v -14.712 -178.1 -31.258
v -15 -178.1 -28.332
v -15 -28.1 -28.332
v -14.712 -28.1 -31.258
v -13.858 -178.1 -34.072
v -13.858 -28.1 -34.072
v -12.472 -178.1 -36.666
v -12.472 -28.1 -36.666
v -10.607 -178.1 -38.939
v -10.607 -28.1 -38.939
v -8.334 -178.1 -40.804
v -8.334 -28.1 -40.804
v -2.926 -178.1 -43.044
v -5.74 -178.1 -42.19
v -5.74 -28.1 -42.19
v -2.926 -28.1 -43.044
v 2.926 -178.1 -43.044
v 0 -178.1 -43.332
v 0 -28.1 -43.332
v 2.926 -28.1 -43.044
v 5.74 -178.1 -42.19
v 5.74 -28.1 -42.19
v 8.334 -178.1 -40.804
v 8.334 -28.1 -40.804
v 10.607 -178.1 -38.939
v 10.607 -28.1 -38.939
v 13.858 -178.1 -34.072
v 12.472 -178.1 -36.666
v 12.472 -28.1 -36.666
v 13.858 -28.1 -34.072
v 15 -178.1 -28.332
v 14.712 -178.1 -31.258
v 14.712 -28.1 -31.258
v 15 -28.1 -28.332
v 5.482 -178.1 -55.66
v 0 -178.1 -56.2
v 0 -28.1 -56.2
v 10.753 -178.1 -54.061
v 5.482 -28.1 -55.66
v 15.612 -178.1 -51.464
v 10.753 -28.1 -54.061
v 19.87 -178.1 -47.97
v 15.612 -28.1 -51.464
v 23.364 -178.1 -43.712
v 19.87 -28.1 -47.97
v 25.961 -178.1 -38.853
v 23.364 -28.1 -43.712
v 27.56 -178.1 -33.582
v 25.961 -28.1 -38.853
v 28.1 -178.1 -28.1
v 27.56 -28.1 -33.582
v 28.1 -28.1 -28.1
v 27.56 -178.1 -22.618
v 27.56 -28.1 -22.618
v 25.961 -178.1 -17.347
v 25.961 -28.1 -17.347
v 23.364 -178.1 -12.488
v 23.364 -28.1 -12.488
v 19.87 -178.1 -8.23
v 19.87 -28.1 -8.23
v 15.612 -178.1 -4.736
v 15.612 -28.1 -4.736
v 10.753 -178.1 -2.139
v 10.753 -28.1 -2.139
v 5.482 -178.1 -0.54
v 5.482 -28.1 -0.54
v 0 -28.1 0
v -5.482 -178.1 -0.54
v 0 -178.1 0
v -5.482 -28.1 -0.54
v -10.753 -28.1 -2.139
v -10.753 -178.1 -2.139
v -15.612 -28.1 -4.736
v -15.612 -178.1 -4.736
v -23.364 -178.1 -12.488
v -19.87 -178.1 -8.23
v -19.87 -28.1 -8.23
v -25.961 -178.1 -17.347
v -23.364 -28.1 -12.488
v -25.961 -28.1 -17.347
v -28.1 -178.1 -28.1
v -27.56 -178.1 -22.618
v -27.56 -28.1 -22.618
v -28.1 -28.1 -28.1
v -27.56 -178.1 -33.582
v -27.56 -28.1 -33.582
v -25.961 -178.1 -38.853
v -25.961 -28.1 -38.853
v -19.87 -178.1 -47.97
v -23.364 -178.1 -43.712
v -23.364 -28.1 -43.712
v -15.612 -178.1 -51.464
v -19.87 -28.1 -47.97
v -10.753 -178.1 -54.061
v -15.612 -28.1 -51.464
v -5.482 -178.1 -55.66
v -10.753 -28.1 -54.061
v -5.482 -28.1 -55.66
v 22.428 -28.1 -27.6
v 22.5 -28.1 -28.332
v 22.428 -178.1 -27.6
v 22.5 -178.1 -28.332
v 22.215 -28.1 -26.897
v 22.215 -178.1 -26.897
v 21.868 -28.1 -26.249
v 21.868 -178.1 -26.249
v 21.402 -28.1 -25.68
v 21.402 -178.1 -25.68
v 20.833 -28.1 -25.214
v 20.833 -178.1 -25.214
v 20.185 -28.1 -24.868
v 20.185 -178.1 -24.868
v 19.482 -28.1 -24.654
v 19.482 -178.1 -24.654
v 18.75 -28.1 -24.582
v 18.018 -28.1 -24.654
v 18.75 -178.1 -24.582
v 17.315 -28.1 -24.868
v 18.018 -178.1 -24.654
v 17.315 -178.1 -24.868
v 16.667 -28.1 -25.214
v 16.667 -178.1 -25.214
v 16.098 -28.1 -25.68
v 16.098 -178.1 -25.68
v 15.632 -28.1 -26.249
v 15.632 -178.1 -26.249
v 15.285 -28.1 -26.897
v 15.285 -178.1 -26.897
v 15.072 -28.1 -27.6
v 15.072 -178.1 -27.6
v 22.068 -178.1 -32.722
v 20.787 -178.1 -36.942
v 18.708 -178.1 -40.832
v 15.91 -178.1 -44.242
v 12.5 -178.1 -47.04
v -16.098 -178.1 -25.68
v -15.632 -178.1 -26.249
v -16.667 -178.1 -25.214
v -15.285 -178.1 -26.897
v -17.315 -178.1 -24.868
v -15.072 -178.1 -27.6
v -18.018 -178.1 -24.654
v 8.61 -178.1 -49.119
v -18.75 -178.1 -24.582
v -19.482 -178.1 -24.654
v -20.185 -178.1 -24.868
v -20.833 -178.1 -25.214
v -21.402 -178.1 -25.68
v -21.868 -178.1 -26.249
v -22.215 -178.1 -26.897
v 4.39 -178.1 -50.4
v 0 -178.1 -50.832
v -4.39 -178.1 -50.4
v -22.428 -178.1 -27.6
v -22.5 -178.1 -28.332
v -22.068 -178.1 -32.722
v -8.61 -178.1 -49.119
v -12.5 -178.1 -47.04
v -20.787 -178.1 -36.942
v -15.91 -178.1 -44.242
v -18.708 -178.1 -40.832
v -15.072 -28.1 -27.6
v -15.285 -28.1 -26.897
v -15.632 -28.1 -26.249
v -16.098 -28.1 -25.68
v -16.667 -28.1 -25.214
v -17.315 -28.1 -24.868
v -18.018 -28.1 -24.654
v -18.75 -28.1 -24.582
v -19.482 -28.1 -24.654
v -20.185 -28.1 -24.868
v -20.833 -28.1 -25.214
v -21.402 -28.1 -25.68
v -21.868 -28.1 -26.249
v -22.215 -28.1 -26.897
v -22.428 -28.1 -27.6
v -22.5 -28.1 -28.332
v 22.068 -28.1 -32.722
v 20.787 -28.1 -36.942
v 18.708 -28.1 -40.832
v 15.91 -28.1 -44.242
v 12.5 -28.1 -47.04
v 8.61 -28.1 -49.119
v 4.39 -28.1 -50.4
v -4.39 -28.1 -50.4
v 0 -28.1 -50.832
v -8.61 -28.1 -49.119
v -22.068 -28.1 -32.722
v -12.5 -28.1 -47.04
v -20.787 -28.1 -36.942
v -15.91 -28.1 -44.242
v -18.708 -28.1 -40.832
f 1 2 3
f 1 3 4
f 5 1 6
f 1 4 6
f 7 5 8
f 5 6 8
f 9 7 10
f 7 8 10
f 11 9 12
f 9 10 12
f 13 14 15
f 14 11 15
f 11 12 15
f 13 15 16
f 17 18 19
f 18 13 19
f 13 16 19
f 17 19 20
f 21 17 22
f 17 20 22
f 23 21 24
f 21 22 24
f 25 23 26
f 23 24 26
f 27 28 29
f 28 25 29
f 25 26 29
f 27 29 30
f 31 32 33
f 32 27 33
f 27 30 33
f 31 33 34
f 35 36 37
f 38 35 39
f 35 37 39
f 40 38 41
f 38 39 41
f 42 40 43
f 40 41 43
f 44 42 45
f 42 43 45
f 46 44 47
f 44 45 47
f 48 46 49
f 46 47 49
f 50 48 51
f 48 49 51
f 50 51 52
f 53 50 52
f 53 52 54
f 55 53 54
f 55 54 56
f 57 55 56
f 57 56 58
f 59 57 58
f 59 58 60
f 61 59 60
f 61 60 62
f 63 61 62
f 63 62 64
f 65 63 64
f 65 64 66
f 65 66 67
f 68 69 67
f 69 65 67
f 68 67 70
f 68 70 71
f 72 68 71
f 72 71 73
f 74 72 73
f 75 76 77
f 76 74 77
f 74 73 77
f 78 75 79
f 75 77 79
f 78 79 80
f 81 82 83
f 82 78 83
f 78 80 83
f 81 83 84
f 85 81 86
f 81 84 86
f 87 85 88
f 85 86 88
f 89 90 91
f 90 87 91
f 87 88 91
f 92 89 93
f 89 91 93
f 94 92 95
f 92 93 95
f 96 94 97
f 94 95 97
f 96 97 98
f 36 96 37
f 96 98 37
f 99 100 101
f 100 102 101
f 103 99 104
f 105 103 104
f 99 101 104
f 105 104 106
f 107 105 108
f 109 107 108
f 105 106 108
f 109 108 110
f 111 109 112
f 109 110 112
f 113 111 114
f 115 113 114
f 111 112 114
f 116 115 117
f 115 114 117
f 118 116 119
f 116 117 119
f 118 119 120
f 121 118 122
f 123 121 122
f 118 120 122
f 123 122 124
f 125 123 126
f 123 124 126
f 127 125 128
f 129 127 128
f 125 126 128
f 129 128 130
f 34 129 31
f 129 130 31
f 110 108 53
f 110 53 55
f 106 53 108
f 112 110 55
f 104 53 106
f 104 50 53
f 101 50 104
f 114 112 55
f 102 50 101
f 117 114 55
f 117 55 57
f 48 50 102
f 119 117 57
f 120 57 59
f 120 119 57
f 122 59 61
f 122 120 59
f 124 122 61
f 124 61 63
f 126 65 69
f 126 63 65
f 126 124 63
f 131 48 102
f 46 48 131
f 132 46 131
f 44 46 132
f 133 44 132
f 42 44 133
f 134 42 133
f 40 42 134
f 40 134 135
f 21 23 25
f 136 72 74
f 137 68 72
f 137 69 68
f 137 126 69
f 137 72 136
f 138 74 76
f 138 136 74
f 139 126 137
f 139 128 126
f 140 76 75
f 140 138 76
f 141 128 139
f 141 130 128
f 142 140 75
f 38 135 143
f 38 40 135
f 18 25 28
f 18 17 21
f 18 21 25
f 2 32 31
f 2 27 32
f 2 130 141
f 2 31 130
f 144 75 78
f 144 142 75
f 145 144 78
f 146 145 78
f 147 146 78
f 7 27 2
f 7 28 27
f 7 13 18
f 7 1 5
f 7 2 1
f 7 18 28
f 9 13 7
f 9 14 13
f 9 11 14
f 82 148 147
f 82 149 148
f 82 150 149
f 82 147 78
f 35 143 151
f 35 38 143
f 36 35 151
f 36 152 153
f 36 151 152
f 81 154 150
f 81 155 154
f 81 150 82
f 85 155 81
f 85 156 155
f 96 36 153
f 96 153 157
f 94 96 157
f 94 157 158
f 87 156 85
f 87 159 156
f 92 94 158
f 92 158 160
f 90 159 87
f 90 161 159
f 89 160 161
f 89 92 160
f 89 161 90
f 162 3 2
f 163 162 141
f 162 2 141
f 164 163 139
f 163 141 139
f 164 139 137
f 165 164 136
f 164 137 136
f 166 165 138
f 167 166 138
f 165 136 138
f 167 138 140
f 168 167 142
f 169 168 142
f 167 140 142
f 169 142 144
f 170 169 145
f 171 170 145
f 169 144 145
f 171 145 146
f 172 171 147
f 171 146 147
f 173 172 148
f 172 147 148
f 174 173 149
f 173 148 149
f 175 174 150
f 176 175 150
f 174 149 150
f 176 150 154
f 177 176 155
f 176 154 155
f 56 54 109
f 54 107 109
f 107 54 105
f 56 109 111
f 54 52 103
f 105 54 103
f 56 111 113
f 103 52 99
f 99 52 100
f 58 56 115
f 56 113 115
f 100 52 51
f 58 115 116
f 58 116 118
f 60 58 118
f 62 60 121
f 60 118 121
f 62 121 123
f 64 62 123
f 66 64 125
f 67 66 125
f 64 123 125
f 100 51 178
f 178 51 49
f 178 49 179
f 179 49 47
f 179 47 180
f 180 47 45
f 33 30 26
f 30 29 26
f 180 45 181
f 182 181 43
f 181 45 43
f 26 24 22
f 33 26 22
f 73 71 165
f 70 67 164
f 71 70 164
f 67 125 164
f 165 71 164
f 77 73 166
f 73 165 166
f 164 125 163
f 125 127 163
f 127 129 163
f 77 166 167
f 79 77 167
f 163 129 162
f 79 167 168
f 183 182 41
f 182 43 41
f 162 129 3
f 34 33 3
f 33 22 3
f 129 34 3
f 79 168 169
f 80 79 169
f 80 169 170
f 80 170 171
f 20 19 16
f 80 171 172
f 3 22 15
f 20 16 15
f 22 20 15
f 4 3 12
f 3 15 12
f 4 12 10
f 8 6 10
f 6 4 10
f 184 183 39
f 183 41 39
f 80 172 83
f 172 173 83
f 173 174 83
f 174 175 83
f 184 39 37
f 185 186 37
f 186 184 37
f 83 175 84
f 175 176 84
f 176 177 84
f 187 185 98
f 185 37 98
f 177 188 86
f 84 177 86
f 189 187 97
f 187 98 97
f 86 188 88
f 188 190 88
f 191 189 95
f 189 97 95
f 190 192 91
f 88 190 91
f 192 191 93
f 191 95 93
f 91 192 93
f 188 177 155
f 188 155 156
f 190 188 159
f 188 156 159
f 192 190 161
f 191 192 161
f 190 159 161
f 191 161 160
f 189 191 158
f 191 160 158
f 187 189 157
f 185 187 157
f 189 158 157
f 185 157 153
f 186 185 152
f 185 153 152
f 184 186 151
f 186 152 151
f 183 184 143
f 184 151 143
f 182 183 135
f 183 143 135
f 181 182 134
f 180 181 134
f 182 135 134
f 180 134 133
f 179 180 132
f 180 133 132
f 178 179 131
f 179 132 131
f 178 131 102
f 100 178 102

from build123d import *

# Parameters (mm, degrees)
SKETCH1_R           = 28.1
BOSS_EXTRUDE2_DEPTH = 61.3
SKETCH3_R           = 18.6
CUT_EXTRUDE2_DEPTH  = 58.8
SKETCH4_W           = 56.2
SKETCH4_H           = 56.2
BOSS_EXTRUDE3_DEPTH = 56.2
SKETCH5_R           = 16.1
CUT_EXTRUDE4_DEPTH  = 5
SKETCH6_W           = 49.797391422
SKETCH6_H           = 49.779255452
CUT_EXTRUDE5_DEPTH  = 53.7
SKETCH7_R           = 28.1
BOSS_EXTRUDE4_DEPTH = 321.5
CUT_EXTRUDE6_DEPTH  = 10
SKETCH9_R           = 3
CUT_EXTRUDE7_DEPTH  = 1
SKETCH10_R          = 6.025
CUT_EXTRUDE8_DEPTH  = 0.1
SKETCH18_R          = 3.75
CUT_EXTRUDE9_DEPTH  = 100
SKETCH19_R          = 3.75
CUT_EXTRUDE11_DEPTH = 325
SKETCH20_W          = 56.2
SKETCH20_H          = 56.2
CUT_EXTRUDE13_DEPTH = 200
SKETCH22_R          = 28.332078896
CUT_EXTRUDE15_DEPTH = 171.5


with BuildPart() as part:
    # Sketch1 → Boss-Extrude2 (new body)
    with BuildSketch(Plane.XY):
        Circle(SKETCH1_R)
    extrude(amount=BOSS_EXTRUDE2_DEPTH)

    # Sketch3 → Cut-Extrude2 (cut)
    with BuildSketch(Plane.XY.offset(61.3)):
        with Locations((0, -7)):
            Circle(SKETCH3_R)
    extrude(amount=-CUT_EXTRUDE2_DEPTH, mode=Mode.SUBTRACT)

    # Sketch4 → Boss-Extrude3 (add)
    with BuildSketch(Plane(origin=(0, 0, 0), x_dir=(-1, 0, 0), z_dir=(0, 0, -1))):
        Rectangle(SKETCH4_W, SKETCH4_H)
    extrude(amount=BOSS_EXTRUDE3_DEPTH)

    # Sketch5 → Cut-Extrude4 (cut)
    with BuildSketch(Plane.XY.offset(2.5)):
        with Locations((0, -7)):
            Circle(SKETCH5_R)
    extrude(amount=-CUT_EXTRUDE4_DEPTH, mode=Mode.SUBTRACT)

    # Sketch6 → Cut-Extrude5 (cut)
    with BuildSketch(Plane(origin=(0, 0, -56.2), x_dir=(-1, 0, 0), z_dir=(0, 0, -1))):
        Rectangle(SKETCH6_W, SKETCH6_H)
    extrude(amount=-CUT_EXTRUDE5_DEPTH, mode=Mode.SUBTRACT)

    # Sketch7 → Boss-Extrude4 (add)
    with BuildSketch(Plane(origin=(0, -28.1, 0), x_dir=(-1, 0, 0), z_dir=(0, -1, 0))):
        with Locations(Location((0, 28.1, 0), (0, 0, 90))):
            Circle(SKETCH7_R)
    extrude(amount=BOSS_EXTRUDE4_DEPTH)

    # Sketch8 → Cut-Extrude6 (cut)
    with BuildSketch(Plane(origin=(0, -349.6, 0), x_dir=(-1, 0, 0), z_dir=(0, -1, 0))):
        with BuildLine():
            Line((-1.658312395, 25.832078896), (1.658312395, 25.832078896))
            ThreePointArc((1.658312395, 25.832078896), (3, 28.332078896), (1.658312395, 30.832078896))
            Line((1.658312395, 30.832078896), (-1.658312395, 30.832078896))
            ThreePointArc((-1.658312395, 30.832078896), (-3, 28.332078896), (-1.658312395, 25.832078896))
        make_face()
    extrude(amount=-CUT_EXTRUDE6_DEPTH, mode=Mode.SUBTRACT)

    # Sketch9 → Cut-Extrude7 (cut)
    with BuildSketch(Plane(origin=(0, -349.6, 0), x_dir=(-1, 0, 0), z_dir=(0, -1, 0))):
        with Locations(Location((0, 28.332078896, 0), (0, 0, 90))):
            Circle(SKETCH9_R)
    extrude(amount=-CUT_EXTRUDE7_DEPTH, mode=Mode.SUBTRACT)

    # Sketch10 → Cut-Extrude8 (cut)
    with BuildSketch(Plane(origin=(0, -349.6, 0), x_dir=(-1, 0, 0), z_dir=(0, -1, 0))):
        with Locations(Location((0, 28.332078896, 0), (0, 0, 90))):
            Circle(SKETCH10_R)
    extrude(amount=-CUT_EXTRUDE8_DEPTH, mode=Mode.SUBTRACT)

    # Cut-Sweep4: sweep along a path in Sketch15
    with BuildLine(Plane(origin=(0, -349.6, 0), x_dir=(-1, 0, 0), z_dir=(0, -1, 0))) as cut_sweep4_path:
        ThreePointArc((15, 28.332078896), (0, 43.332078896), (-15, 28.332078896))
    # 3DSketch2 → Cut-Sweep4 (sweep, cut)
    with BuildSketch(Plane(origin=(-15, -349.6, -28.332078896), x_dir=(-0.022748965612757834, 0.999741208795331, 0), z_dir=(0, 0, 1))):
        Polygon((0, 0), (0.170617242, 7.498059066), (329.685319661, 0), (329.514702419, -7.498059066), align=None)
    sweep(path=cut_sweep4_path.line, mode=Mode.SUBTRACT)

    # Sketch18 → Cut-Extrude9 (cut)
    with BuildSketch(Plane.XY.offset(61.3)):
        with Locations((0, 18.75)):
            Circle(SKETCH18_R)
    extrude(amount=-CUT_EXTRUDE9_DEPTH, mode=Mode.SUBTRACT)

    # Sketch19 → Cut-Extrude11 (cut)
    with BuildSketch(Plane(origin=(0, -349.6, 0), x_dir=(-1, 0, 0), z_dir=(0, -1, 0))):
        with Locations((-18.75, 28.332078896)):
            Circle(SKETCH19_R)
        with Locations((18.75, 28.332078896)):
            Circle(SKETCH19_R)
    extrude(amount=-CUT_EXTRUDE11_DEPTH, mode=Mode.SUBTRACT)

    # Sketch20 → Cut-Extrude13 (cut)
    with BuildSketch(Plane(origin=(0, 0, -56.2), x_dir=(-1, 0, 0), z_dir=(0, 0, -1))):
        Rectangle(SKETCH20_W, SKETCH20_H)
    extrude(amount=-CUT_EXTRUDE13_DEPTH, mode=Mode.SUBTRACT)

    # Sketch22 → Cut-Extrude15 (cut)
    with BuildSketch(Plane(origin=(0, -349.6, 0), x_dir=(-1, 0, 0), z_dir=(0, -1, 0))):
        with Locations((0, 28.332078896)):
            Circle(SKETCH22_R)
    extrude(amount=-CUT_EXTRUDE15_DEPTH, mode=Mode.SUBTRACT)


solid = part.part
